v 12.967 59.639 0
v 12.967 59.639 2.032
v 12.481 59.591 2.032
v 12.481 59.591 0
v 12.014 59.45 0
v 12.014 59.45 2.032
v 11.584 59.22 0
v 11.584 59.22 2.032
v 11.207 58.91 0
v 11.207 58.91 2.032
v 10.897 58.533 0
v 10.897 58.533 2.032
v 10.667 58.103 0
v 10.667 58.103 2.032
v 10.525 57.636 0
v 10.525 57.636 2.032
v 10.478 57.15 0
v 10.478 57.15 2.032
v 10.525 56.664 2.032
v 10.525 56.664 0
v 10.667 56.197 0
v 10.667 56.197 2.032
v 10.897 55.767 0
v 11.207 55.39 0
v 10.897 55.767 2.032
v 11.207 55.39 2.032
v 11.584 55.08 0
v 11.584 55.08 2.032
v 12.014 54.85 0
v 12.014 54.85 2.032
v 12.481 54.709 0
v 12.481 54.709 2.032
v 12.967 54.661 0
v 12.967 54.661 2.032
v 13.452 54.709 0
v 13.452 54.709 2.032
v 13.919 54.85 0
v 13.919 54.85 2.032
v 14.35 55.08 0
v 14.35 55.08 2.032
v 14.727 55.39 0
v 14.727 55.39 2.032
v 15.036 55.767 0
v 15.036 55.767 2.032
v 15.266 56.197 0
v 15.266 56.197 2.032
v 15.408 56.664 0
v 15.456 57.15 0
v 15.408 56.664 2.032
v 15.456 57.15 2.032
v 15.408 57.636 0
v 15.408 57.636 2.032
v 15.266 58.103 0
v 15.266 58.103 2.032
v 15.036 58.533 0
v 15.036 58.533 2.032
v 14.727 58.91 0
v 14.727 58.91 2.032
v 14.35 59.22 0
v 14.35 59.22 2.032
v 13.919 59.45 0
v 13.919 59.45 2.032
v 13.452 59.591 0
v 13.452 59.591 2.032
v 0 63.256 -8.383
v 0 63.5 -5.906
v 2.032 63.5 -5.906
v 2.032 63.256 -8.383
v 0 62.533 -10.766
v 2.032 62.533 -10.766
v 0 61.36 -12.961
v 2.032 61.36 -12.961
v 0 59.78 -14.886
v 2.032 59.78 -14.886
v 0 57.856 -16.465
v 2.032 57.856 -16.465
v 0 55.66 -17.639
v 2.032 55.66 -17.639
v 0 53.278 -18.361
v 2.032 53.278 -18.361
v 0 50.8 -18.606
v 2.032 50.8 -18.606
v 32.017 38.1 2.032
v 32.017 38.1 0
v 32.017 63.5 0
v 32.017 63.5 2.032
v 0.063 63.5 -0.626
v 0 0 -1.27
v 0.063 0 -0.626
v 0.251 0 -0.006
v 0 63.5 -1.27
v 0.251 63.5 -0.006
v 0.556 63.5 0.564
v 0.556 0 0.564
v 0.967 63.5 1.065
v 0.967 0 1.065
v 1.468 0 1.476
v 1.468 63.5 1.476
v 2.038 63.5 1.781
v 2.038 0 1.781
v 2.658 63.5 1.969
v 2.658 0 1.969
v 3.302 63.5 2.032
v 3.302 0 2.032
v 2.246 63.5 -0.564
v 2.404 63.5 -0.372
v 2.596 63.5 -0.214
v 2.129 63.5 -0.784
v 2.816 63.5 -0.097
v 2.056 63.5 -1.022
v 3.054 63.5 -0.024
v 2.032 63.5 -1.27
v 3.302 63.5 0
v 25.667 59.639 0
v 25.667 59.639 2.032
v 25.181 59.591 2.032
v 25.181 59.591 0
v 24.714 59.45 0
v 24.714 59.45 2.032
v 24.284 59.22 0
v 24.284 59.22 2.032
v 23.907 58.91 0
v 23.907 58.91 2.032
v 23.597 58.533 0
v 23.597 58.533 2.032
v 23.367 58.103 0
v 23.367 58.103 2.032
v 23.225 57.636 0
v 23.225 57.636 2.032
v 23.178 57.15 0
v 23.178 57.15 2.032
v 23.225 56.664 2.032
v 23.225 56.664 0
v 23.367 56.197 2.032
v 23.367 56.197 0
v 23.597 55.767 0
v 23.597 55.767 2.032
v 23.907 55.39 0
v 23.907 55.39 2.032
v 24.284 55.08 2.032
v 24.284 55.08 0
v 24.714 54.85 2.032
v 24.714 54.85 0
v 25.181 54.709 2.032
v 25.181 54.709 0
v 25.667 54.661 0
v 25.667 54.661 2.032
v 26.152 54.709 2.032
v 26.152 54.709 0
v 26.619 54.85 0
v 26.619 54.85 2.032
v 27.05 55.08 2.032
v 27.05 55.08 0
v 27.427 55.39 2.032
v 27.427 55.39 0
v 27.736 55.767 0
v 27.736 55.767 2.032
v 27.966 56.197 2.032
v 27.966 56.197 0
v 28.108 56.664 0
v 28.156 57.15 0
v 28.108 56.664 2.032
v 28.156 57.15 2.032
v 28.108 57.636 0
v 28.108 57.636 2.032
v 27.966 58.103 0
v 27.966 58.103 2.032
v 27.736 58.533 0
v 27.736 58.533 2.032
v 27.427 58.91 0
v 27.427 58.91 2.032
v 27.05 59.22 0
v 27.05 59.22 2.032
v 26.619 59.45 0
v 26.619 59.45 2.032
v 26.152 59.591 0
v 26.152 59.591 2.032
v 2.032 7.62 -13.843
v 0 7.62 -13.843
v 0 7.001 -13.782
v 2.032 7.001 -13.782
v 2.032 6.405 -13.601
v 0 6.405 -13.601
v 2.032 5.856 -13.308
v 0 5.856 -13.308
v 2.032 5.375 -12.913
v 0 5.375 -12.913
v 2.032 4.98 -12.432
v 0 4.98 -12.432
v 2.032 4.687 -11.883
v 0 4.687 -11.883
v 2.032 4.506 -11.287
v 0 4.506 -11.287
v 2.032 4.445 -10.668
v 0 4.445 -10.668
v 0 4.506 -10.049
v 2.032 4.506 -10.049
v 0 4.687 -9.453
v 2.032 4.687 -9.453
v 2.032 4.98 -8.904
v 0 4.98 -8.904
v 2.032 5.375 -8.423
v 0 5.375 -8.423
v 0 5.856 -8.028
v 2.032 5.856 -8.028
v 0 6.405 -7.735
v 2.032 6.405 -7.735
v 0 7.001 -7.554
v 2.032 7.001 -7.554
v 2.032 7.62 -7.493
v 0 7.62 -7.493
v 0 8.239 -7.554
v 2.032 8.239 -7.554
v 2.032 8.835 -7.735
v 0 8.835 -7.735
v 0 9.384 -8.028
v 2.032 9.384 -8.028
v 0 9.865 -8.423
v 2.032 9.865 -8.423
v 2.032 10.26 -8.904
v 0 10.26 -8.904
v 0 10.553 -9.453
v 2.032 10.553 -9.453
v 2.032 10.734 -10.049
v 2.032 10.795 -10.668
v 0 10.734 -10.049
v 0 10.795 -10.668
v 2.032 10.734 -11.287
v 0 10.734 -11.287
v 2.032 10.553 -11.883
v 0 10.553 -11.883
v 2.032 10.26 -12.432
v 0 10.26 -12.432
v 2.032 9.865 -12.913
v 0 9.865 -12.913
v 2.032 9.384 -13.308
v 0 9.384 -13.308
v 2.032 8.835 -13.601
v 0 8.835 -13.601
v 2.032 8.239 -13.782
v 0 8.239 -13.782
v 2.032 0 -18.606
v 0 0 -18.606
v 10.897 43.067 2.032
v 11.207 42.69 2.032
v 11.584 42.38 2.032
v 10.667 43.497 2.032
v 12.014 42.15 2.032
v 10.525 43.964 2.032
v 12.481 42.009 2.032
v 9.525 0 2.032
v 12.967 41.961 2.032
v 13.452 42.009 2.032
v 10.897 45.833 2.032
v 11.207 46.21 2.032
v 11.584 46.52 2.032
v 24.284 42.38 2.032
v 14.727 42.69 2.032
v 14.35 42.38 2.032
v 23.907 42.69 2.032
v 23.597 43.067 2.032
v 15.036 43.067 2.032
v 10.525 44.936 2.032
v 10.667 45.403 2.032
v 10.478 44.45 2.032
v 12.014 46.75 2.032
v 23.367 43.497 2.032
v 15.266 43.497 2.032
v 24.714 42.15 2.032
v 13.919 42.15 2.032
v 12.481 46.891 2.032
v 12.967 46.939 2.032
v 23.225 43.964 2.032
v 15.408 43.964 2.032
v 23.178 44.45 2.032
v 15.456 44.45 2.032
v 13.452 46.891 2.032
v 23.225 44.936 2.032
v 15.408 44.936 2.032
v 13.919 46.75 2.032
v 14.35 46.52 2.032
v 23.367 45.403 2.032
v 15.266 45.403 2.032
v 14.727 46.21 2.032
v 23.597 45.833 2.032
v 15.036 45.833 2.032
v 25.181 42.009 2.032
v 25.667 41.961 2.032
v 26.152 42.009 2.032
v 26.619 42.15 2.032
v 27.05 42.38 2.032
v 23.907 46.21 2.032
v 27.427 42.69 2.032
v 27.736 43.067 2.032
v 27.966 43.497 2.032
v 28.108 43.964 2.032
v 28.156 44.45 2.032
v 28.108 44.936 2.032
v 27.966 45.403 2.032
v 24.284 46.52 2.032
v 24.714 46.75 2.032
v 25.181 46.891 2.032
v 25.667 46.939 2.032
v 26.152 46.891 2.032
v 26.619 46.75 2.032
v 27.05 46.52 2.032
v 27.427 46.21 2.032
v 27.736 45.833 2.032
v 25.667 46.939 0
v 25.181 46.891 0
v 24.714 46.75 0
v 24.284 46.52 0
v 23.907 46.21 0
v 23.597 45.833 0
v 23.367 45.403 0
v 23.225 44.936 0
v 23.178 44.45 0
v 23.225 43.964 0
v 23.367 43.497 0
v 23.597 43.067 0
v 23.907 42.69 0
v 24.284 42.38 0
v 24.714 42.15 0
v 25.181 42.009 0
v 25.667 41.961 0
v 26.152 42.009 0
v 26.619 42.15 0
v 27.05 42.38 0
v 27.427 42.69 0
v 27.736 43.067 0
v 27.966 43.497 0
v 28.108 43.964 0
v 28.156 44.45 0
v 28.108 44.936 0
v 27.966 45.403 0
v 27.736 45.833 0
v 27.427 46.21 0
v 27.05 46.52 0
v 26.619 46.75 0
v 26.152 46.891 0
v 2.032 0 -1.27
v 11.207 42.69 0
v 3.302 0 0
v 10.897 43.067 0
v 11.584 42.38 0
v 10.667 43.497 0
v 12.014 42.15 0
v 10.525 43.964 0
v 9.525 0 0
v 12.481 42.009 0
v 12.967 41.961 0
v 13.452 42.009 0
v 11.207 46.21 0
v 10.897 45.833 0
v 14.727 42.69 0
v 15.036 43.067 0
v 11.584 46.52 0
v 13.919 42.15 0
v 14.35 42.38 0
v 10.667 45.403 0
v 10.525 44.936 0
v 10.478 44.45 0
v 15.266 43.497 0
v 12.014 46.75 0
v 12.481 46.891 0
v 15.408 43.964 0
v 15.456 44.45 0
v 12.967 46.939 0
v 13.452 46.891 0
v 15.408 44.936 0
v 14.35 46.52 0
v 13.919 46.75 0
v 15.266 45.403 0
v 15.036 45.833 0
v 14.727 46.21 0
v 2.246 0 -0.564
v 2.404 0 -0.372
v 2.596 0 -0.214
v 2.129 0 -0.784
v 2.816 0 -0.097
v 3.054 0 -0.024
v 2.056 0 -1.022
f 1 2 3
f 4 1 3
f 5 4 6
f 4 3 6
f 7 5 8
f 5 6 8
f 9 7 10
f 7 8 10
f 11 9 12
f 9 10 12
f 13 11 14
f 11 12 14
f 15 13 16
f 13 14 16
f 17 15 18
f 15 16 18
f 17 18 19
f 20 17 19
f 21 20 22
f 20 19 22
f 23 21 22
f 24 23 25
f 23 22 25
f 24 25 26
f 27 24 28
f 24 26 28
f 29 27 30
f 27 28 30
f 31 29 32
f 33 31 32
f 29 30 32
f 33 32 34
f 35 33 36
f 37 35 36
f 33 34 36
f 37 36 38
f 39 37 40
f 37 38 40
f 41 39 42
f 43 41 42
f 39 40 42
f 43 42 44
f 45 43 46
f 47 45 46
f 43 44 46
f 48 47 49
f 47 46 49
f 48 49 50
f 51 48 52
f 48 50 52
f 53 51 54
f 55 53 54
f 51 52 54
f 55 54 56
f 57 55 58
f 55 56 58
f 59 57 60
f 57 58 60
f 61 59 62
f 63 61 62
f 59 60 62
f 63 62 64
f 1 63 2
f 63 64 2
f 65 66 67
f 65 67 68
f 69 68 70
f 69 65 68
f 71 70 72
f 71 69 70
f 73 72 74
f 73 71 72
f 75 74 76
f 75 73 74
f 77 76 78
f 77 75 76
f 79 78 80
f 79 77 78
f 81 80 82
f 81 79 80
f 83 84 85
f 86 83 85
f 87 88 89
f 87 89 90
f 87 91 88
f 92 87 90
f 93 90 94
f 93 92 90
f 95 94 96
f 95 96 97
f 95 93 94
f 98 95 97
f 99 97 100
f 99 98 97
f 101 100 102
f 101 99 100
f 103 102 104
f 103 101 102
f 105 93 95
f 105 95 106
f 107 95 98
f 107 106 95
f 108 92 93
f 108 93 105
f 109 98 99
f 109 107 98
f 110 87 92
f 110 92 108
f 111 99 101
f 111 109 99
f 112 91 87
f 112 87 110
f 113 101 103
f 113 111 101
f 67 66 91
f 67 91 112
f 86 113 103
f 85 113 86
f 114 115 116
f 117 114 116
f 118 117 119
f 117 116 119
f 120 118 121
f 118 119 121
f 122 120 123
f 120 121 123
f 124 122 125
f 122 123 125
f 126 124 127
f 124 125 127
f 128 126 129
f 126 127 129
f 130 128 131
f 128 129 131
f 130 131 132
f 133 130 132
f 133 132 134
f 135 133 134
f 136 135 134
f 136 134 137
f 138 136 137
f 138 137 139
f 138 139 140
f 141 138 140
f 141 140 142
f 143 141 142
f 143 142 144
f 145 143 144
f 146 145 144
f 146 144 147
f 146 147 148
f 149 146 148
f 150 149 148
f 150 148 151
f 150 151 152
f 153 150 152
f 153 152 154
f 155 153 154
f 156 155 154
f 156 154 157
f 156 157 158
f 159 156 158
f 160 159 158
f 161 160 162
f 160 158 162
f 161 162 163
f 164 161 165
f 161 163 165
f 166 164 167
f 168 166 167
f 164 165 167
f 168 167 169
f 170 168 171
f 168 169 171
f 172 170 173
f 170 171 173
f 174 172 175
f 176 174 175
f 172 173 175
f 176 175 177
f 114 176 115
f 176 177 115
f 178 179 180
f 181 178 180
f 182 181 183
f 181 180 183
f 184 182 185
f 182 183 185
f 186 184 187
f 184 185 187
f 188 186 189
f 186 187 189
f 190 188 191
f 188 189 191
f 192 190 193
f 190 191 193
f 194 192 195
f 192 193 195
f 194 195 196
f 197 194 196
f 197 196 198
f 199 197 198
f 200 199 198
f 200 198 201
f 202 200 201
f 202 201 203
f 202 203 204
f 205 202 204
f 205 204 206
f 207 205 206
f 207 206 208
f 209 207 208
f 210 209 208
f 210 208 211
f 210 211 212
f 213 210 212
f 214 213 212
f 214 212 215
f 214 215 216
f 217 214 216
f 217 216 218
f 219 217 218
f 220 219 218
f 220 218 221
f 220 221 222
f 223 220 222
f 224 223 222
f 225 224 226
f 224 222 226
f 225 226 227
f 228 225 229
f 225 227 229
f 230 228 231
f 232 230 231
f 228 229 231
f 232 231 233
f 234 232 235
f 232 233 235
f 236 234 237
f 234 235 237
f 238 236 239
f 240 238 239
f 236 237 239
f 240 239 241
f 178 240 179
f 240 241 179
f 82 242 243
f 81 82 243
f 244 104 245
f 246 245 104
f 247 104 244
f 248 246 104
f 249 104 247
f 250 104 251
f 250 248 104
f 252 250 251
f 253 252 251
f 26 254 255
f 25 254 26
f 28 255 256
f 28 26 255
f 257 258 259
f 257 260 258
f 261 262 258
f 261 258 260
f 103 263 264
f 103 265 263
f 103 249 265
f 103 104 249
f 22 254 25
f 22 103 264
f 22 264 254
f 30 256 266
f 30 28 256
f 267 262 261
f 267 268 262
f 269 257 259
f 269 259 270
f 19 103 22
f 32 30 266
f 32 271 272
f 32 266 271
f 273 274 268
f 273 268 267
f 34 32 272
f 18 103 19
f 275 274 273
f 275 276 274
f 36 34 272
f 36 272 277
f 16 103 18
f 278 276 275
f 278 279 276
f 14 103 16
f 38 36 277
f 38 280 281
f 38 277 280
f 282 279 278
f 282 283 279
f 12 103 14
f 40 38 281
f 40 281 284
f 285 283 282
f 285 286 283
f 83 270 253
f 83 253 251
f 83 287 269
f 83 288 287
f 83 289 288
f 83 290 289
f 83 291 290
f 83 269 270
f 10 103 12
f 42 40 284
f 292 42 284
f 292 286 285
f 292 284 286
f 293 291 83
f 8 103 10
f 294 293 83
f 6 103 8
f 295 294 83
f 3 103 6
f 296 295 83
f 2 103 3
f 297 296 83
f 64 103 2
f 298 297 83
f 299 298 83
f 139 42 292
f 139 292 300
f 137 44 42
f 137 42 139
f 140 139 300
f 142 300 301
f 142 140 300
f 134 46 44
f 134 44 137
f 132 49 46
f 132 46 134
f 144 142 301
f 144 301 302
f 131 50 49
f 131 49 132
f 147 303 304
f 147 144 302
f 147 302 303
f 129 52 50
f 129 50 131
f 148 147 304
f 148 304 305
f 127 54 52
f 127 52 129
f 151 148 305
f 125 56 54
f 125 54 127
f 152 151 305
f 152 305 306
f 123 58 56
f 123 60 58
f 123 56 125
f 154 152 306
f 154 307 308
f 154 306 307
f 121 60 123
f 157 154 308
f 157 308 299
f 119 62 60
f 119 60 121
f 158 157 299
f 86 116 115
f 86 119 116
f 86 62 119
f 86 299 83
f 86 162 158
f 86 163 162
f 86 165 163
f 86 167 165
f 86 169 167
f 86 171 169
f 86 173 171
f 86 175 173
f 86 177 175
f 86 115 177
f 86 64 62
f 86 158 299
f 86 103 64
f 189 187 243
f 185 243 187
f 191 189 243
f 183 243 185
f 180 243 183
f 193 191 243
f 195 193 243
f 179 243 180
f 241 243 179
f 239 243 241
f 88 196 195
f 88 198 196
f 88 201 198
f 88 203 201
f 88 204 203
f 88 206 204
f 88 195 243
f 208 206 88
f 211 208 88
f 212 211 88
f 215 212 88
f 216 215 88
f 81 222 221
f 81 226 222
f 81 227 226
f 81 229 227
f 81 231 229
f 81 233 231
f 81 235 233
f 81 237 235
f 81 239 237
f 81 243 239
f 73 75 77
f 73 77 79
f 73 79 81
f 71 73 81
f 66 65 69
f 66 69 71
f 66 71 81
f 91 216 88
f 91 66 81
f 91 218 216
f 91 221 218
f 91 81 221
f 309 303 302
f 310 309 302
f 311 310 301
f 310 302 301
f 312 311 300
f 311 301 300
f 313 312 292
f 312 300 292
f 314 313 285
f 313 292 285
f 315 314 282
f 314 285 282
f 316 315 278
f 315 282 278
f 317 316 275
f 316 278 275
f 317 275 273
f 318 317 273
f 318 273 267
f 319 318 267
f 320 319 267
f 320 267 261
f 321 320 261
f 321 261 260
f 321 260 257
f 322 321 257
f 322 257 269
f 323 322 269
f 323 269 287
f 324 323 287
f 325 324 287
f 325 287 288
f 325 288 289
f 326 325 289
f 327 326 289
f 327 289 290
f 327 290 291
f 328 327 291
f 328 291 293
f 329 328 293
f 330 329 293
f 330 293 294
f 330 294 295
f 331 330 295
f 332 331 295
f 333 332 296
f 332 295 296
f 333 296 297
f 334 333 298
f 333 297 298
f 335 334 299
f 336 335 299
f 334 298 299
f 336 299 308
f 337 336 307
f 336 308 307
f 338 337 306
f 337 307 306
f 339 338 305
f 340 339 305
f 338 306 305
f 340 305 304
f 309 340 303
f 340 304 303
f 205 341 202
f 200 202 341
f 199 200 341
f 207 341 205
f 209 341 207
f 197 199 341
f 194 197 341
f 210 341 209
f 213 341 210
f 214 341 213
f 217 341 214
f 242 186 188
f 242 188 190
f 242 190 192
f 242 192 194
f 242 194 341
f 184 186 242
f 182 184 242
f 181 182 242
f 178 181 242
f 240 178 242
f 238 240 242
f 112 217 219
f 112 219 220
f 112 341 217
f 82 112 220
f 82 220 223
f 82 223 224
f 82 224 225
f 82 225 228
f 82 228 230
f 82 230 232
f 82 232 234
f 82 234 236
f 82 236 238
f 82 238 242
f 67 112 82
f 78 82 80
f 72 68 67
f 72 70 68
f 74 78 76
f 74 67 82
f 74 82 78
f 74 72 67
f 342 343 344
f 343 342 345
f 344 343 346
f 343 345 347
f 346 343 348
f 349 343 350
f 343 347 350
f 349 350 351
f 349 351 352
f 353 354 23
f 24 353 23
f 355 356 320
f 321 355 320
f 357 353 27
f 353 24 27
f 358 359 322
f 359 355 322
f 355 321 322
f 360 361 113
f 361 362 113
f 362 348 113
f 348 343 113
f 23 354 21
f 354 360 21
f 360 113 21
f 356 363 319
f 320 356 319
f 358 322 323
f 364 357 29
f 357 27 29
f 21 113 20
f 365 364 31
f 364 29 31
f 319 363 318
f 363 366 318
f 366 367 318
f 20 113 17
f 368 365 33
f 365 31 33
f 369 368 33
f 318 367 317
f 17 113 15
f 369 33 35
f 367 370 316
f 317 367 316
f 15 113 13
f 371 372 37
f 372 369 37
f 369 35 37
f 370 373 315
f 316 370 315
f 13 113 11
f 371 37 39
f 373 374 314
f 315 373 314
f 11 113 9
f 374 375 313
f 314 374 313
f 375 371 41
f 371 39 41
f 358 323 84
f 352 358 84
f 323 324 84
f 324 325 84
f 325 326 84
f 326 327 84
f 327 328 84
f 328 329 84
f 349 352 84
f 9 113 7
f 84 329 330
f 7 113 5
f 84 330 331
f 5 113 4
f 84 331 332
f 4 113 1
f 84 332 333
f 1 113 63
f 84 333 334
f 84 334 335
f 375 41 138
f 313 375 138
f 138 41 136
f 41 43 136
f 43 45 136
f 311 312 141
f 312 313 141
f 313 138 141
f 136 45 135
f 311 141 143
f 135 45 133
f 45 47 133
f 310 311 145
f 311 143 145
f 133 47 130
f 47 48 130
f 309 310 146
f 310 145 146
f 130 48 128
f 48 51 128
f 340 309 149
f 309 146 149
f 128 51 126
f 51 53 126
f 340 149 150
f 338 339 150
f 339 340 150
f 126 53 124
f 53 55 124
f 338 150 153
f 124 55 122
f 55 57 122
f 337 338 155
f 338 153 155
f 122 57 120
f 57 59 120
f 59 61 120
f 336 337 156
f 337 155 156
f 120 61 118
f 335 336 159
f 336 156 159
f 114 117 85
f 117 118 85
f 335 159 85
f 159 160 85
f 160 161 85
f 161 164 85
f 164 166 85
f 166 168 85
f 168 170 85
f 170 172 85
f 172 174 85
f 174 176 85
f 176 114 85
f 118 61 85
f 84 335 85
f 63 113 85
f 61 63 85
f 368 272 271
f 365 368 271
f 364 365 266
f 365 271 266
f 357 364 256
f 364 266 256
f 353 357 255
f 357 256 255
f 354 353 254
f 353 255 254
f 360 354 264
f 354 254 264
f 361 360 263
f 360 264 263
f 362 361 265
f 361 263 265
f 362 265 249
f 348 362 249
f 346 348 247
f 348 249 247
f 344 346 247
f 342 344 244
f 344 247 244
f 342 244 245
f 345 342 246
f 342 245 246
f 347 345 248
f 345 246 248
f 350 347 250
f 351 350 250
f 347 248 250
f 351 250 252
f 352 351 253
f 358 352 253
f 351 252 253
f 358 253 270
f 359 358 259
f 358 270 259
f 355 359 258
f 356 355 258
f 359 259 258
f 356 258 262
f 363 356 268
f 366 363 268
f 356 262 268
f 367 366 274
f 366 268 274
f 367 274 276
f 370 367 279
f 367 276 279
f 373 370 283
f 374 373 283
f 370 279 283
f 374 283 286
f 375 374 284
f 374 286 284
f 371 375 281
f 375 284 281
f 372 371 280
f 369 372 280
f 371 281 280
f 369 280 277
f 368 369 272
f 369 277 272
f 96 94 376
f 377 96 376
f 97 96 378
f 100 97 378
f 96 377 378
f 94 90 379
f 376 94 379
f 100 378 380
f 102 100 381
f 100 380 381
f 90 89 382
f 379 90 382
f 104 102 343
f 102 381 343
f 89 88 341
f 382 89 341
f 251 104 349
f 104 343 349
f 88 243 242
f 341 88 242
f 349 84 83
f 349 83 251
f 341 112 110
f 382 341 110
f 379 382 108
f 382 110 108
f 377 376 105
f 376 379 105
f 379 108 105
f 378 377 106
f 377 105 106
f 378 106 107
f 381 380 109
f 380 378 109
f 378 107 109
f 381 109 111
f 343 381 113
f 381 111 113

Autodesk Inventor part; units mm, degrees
ref_plane "YZ Plane" through (0, 0, 0) normal (1, 0, 0) x (0, 1, 0)
ref_plane "XZ Plane" through (0, 0, 0) normal (0, 1, 0) x (-1, 0, 0)
ref_plane "XY Plane" through (0, 0, 0) normal (0, 0, 1) x (1, 0, 0)
sketch "Sketch1" plane through (0, 0, 0) normal (0, 0, 1) x (1, 0, 0)
  line L0 (0, 0) -> (32.0167, 0)
  line L1 (32.0167, 0) -> (32.0167, 63.5)
  line L2 (32.0167, 63.5) -> (0, 63.5)
  line L3 (0, 63.5) -> (0, 0)
  dimension "d0" = 63.5
  dimension "d1" = 32.0167
extrude "Plate1" add sketch "Sketch1" along normal blind 2.032
sketch "Sketch2" plane through (2.032, 63.5, 2.032) normal (-1, 0, 0) x (0, -1, 0)
  line L0 (63.5, 0) -> (0, 0)
  line L1 (0, 0) -> (0, -20.6375)
  line L2 (0, -20.6375) -> (63.5, -20.6375)
  line L3 (63.5, -20.6375) -> (63.5, 0)
edge flange "Flange1" height 20.6375 angle 90 thickness 2.032 bend radius 1.27 thickness toward (-1, 0, 0) relief tear relief width 2.032 relief depth 1.016 edges at (0, 31.75, 0) wall of the first edge with corners at (2.032, 0, 2.032) (2.032, 63.5, 2.032) (2.032, 63.5, -18.6055) (2.032, 0, -18.6055)
bend "Bend1"
corner "Corner1"
sketch "Sketch3" plane through (0, 0, 0) normal (0, 0, -1) x (-1, 0, 0)
  line L0 (-32.0167, 0) -> (-32.0167, 63.5) projected
  line L1 (-32.0167, 63.5) -> (-3.302, 63.5) projected
  point P0 (0, 0)
  point P1 (-25.6667, 57.15)
  point P2 (-12.9667, 57.15)
  point P3 (-25.6667, 44.45)
  point P4 (-12.9667, 44.45)
  dimension "d13" = 6.35
  dimension "d14" = 6.35
  dimension "d15" = 12.7
  dimension "d16" = 12.7
hole "Hole1" at (25.6667, 57.15, 0) at (12.9667, 57.15, 0) at (25.6667, 44.45, 0) at (12.9667, 44.45, 0) direction (0, 0, 1) diameter 4.9784 end through all
sketch "Sketch4" plane through (2.032, 0, -18.6055) normal (1, 0, 0) x (0, 0, -1)
  line L0 (-20.6375, 63.5) -> (-20.6375, 0) projected
  line L1 (-17.3355, 0) -> (0, 0) projected
  point P0 (-18.6055, 0)
  point P1 (-7.9375, 7.62)
  dimension "d31" = 12.7
  dimension "d32" = 7.62
hole "Hole2" at (2.032, 7.62, -10.668) direction (-1, 0, 0) diameter 6.35 end through all clearance for "Flat Head Machine Screw (82)" size "1/4" standard "Ansi Unified Screw Threads"
fillet "Fillet1" radius 12.7 1 edges at (1.016, 63.5, -18.6055)
sketch "Sketch5" plane through (0, 0, 0) normal (0, 0, -1) x (-1, 0, 0)
  line L0 (-32.0167, 38.1) -> (-9.525, 0)
  line L1 (-32.0167, 0) -> (-3.302, 0) projected
  line L2 (0, 0) -> (0, 50.8) projected
  line L3 (-32.0167, 63.5) -> (-3.302, 63.5) projected
  line L4 (-32.0167, 0) -> (-32.0167, 63.5) projected
  line L5 (-32.0167, 38.1) -> (-32.0167, 0)
  line L6 (-32.0167, 0) -> (-9.525, 0)
  dimension "d34" = 9.525
  dimension "d35" = 25.4
extrude "Extrusion1" cut sketch "Sketch5" against normal through all
equation "\"d22\" = Thickness"
equation "\"d29\" = Thickness"
equation "\"d2\" = Thickness"
equation "\"d3\" = BendReliefWidth"
equation "\"d4\" = BendReliefDepth"
equation "\"d5\" = MinimumRemnant"
equation "\"d6\" = TransitionRadius"
equation "\"d9\" = BendRadius"
equation "\"d10\" = CornerReliefSize"
equation "\"d11\" = GapSize"
equation "\"d12\" = JacobiRadiusSize"
equation "\"BendReliefWidth\" = Thickness"
equation "\"BendReliefDepth\" = 0.5 * Thickness"
equation "\"CornerReliefSize\" = 4 * Thickness"
equation "\"MinimumRemnant\" = 2 * Thickness"
equation "\"TransitionRadius\" = BendRadius"
equation "\"JacobiRadiusSize\" = BendRadius"
equation "\"GapSize\" = Thickness"
equation "\"Thickness\" = 2.032"
equation "\"BendRadius\" = 1.27"
properties part number "Roller bracket" material "Aluminum 6061"
